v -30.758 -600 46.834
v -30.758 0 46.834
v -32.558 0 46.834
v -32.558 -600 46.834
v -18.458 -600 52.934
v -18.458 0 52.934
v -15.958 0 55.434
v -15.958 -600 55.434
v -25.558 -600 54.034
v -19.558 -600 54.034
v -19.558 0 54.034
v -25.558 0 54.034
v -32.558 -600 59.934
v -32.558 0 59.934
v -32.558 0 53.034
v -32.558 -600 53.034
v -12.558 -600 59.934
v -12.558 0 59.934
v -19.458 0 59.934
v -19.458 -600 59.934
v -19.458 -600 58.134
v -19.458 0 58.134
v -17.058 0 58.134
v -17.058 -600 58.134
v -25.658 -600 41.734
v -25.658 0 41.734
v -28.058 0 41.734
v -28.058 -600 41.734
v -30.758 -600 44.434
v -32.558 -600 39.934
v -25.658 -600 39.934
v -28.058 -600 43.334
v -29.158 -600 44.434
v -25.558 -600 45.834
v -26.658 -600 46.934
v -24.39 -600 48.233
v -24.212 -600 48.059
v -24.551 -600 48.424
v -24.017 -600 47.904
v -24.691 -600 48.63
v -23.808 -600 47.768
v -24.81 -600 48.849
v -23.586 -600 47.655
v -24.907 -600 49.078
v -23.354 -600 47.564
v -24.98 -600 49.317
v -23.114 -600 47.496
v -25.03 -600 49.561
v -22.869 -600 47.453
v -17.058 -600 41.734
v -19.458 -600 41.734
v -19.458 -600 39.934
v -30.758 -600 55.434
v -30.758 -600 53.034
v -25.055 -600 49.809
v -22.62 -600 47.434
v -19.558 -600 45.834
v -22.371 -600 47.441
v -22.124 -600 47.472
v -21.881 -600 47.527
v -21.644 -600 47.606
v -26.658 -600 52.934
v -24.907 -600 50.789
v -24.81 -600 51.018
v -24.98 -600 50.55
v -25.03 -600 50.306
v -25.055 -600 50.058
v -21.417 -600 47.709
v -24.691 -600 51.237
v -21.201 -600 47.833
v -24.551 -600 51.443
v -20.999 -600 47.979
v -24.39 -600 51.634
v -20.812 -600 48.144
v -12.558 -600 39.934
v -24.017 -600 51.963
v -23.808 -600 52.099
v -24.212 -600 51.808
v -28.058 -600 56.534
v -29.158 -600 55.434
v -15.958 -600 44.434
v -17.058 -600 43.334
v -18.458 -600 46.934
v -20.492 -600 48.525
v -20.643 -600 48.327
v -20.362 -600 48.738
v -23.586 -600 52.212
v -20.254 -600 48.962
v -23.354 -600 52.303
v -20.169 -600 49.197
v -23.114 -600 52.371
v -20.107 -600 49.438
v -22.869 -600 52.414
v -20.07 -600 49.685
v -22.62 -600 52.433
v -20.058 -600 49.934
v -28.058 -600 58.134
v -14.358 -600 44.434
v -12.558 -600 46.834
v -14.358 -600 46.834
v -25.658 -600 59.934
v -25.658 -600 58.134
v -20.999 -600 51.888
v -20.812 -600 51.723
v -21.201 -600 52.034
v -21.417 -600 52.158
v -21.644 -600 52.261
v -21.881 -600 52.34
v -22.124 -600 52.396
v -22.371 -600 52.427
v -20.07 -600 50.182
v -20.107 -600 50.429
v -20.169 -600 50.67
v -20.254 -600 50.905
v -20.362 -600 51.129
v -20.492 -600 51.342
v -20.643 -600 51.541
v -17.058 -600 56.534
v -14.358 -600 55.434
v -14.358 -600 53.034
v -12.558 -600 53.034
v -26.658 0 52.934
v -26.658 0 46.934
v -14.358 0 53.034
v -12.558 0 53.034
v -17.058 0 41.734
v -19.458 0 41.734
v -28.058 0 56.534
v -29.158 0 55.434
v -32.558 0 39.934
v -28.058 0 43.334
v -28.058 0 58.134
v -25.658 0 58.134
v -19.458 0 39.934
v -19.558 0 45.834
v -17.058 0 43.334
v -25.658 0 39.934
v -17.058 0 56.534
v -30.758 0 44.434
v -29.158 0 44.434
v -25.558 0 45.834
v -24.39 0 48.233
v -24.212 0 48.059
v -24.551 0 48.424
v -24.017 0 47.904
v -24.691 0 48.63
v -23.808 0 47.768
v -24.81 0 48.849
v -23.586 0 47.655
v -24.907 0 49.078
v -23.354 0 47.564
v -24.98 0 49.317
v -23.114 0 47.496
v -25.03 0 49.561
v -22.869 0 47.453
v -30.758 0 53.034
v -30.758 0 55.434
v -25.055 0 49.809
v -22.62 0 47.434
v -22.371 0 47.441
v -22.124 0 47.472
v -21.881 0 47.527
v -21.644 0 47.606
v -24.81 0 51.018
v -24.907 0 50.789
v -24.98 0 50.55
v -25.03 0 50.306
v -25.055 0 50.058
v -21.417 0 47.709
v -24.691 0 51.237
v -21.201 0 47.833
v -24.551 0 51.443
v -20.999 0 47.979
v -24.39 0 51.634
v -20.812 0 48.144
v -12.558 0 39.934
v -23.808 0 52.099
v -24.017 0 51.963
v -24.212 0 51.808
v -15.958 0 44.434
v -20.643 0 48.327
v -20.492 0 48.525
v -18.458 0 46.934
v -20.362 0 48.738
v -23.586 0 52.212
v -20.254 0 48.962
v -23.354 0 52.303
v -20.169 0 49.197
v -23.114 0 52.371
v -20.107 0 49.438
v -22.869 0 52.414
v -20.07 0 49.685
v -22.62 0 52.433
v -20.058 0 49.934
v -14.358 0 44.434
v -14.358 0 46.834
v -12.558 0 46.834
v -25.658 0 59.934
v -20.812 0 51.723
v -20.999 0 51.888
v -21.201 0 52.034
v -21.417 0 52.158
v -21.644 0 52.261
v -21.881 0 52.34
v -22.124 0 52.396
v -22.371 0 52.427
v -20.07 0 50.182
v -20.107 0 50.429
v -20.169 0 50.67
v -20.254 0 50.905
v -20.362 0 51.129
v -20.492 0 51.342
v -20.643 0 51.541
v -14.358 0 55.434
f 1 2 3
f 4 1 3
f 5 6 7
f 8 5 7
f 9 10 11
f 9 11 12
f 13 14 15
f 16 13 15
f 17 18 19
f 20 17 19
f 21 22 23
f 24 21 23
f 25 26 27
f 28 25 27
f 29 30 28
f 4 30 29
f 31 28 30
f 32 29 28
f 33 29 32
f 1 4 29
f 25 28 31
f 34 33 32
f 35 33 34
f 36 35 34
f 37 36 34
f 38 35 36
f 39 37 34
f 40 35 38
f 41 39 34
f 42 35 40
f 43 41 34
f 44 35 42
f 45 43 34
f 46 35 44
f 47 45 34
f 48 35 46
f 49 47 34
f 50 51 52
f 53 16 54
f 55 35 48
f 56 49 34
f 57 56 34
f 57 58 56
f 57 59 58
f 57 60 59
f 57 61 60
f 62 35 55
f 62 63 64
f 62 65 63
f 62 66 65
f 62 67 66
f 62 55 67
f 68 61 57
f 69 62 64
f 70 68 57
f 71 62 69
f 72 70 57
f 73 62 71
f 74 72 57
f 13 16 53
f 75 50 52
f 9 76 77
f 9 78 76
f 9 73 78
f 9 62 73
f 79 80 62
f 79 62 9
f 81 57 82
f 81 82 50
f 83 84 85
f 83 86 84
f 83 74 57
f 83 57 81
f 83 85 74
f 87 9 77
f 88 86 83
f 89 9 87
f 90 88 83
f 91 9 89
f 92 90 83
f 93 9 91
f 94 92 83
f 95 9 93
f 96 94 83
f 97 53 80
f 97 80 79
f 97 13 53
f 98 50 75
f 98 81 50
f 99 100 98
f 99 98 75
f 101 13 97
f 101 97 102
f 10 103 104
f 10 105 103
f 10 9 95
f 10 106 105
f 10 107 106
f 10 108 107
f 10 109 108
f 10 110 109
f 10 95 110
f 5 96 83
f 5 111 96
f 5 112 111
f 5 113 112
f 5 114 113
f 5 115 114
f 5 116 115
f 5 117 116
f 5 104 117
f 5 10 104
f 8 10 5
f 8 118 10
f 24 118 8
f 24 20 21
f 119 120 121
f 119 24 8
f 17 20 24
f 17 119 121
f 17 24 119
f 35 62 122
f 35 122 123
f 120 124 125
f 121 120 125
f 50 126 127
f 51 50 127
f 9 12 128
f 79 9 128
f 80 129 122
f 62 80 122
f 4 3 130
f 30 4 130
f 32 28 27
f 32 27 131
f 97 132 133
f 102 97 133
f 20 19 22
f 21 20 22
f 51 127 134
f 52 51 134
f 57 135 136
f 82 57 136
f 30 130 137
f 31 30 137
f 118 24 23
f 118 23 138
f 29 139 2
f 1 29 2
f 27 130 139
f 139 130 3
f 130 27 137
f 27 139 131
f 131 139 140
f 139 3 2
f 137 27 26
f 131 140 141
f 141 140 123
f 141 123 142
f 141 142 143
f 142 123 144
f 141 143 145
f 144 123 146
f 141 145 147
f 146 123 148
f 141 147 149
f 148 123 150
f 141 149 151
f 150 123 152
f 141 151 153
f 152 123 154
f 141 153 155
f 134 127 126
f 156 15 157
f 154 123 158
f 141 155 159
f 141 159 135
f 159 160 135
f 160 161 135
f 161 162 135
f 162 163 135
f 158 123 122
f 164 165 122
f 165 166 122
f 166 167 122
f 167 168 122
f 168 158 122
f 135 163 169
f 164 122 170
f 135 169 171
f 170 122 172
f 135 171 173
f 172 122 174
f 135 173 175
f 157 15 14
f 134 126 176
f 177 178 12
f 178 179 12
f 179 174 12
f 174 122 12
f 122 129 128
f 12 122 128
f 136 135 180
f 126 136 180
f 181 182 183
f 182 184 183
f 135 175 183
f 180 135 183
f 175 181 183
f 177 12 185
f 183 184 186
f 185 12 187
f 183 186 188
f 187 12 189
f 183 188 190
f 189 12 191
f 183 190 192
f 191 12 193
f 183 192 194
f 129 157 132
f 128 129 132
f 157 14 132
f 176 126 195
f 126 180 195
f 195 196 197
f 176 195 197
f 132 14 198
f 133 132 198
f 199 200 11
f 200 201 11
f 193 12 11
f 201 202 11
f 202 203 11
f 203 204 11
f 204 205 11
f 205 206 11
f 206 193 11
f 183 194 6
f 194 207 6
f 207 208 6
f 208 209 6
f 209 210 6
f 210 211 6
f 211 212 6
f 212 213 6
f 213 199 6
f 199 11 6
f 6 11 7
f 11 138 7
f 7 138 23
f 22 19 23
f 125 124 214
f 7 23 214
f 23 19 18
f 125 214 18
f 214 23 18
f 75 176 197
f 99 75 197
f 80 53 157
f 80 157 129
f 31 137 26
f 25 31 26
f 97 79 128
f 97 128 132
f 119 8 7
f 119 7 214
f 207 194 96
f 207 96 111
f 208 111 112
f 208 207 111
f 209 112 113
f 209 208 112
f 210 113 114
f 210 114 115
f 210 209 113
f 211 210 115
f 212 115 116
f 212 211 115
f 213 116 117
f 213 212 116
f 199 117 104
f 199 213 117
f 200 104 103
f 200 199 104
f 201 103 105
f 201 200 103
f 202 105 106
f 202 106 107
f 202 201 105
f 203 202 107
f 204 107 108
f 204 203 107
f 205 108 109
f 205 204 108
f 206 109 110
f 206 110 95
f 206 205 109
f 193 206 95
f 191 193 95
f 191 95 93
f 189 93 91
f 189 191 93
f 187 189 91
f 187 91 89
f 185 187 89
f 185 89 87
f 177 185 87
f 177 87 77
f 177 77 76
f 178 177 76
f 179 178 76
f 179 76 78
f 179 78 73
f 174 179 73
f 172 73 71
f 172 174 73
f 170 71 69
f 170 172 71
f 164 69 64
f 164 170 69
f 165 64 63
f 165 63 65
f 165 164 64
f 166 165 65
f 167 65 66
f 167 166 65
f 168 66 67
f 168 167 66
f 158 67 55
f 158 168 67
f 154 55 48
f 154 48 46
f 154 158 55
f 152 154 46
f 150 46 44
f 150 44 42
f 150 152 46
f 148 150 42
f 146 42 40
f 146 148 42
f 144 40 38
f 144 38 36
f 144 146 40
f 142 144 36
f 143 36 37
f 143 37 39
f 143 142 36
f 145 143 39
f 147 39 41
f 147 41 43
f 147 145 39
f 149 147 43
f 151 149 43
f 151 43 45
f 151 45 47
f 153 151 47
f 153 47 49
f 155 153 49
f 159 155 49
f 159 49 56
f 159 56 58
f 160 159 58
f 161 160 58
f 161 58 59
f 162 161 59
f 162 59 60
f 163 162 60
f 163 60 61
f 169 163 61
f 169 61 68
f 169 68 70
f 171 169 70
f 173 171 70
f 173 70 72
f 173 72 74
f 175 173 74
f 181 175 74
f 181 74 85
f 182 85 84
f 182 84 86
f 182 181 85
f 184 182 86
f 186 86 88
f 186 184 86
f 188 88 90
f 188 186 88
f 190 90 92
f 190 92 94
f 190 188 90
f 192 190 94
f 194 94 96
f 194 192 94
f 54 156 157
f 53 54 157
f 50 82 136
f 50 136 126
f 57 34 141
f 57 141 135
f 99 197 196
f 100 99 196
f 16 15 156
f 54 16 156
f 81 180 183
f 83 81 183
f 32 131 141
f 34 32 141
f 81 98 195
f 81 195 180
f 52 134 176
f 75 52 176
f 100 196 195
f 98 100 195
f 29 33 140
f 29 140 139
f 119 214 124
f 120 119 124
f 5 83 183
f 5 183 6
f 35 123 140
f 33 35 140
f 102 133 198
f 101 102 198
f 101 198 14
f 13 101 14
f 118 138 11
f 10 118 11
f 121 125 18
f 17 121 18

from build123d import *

# Parameters (mm, degrees)
F0_R     = 2.5
F1_DEPTH = 600


with BuildPart() as f1:
    # F0 (on Front) → F1 (new body)
    with BuildSketch(Plane.XZ):
        Polygon((-25.657687, 59.933542), (-32.557687, 59.933542), (-32.557687, 53.033542), (-30.757687, 53.033542), (-30.757687, 55.433542), (-29.157687, 55.433542), (-26.657687, 52.933542), (-26.657687, 46.933542), (-29.157687, 44.433542), (-30.757687, 44.433542), (-30.757687, 46.833542), (-32.557687, 46.833542), (-32.557687, 39.933542), (-25.657687, 39.933542), (-25.657687, 41.733542), (-28.057687, 41.733542), (-28.057687, 43.333542), (-25.557687, 45.833542), (-22.557687, 45.833542), (-19.557687, 45.833542), (-17.057687, 43.333542), (-17.057687, 41.733542), (-19.457687, 41.733542), (-19.457687, 39.933542), (-12.557687, 39.933542), (-12.557687, 46.833542), (-14.357687, 46.833542), (-14.357687, 44.433542), (-15.957687, 44.433542), (-18.457687, 46.933542), (-18.457687, 52.933542), (-15.957687, 55.433542), (-14.357687, 55.433542), (-14.357687, 53.033542), (-12.557687, 53.033542), (-12.557687, 59.933542), (-19.457687, 59.933542), (-19.457687, 58.133542), (-17.057687, 58.133542), (-17.057687, 56.533542), (-19.557687, 54.033542), (-22.557687, 54.033542), (-25.557687, 54.033542), (-28.057687, 56.533542), (-28.057687, 58.133542), (-25.657687, 58.133542), align=None)
        with Locations((-22.557687, 49.933542)):
            Circle(F0_R, mode=Mode.SUBTRACT)
    extrude(amount=F1_DEPTH)


solid = f1.part
